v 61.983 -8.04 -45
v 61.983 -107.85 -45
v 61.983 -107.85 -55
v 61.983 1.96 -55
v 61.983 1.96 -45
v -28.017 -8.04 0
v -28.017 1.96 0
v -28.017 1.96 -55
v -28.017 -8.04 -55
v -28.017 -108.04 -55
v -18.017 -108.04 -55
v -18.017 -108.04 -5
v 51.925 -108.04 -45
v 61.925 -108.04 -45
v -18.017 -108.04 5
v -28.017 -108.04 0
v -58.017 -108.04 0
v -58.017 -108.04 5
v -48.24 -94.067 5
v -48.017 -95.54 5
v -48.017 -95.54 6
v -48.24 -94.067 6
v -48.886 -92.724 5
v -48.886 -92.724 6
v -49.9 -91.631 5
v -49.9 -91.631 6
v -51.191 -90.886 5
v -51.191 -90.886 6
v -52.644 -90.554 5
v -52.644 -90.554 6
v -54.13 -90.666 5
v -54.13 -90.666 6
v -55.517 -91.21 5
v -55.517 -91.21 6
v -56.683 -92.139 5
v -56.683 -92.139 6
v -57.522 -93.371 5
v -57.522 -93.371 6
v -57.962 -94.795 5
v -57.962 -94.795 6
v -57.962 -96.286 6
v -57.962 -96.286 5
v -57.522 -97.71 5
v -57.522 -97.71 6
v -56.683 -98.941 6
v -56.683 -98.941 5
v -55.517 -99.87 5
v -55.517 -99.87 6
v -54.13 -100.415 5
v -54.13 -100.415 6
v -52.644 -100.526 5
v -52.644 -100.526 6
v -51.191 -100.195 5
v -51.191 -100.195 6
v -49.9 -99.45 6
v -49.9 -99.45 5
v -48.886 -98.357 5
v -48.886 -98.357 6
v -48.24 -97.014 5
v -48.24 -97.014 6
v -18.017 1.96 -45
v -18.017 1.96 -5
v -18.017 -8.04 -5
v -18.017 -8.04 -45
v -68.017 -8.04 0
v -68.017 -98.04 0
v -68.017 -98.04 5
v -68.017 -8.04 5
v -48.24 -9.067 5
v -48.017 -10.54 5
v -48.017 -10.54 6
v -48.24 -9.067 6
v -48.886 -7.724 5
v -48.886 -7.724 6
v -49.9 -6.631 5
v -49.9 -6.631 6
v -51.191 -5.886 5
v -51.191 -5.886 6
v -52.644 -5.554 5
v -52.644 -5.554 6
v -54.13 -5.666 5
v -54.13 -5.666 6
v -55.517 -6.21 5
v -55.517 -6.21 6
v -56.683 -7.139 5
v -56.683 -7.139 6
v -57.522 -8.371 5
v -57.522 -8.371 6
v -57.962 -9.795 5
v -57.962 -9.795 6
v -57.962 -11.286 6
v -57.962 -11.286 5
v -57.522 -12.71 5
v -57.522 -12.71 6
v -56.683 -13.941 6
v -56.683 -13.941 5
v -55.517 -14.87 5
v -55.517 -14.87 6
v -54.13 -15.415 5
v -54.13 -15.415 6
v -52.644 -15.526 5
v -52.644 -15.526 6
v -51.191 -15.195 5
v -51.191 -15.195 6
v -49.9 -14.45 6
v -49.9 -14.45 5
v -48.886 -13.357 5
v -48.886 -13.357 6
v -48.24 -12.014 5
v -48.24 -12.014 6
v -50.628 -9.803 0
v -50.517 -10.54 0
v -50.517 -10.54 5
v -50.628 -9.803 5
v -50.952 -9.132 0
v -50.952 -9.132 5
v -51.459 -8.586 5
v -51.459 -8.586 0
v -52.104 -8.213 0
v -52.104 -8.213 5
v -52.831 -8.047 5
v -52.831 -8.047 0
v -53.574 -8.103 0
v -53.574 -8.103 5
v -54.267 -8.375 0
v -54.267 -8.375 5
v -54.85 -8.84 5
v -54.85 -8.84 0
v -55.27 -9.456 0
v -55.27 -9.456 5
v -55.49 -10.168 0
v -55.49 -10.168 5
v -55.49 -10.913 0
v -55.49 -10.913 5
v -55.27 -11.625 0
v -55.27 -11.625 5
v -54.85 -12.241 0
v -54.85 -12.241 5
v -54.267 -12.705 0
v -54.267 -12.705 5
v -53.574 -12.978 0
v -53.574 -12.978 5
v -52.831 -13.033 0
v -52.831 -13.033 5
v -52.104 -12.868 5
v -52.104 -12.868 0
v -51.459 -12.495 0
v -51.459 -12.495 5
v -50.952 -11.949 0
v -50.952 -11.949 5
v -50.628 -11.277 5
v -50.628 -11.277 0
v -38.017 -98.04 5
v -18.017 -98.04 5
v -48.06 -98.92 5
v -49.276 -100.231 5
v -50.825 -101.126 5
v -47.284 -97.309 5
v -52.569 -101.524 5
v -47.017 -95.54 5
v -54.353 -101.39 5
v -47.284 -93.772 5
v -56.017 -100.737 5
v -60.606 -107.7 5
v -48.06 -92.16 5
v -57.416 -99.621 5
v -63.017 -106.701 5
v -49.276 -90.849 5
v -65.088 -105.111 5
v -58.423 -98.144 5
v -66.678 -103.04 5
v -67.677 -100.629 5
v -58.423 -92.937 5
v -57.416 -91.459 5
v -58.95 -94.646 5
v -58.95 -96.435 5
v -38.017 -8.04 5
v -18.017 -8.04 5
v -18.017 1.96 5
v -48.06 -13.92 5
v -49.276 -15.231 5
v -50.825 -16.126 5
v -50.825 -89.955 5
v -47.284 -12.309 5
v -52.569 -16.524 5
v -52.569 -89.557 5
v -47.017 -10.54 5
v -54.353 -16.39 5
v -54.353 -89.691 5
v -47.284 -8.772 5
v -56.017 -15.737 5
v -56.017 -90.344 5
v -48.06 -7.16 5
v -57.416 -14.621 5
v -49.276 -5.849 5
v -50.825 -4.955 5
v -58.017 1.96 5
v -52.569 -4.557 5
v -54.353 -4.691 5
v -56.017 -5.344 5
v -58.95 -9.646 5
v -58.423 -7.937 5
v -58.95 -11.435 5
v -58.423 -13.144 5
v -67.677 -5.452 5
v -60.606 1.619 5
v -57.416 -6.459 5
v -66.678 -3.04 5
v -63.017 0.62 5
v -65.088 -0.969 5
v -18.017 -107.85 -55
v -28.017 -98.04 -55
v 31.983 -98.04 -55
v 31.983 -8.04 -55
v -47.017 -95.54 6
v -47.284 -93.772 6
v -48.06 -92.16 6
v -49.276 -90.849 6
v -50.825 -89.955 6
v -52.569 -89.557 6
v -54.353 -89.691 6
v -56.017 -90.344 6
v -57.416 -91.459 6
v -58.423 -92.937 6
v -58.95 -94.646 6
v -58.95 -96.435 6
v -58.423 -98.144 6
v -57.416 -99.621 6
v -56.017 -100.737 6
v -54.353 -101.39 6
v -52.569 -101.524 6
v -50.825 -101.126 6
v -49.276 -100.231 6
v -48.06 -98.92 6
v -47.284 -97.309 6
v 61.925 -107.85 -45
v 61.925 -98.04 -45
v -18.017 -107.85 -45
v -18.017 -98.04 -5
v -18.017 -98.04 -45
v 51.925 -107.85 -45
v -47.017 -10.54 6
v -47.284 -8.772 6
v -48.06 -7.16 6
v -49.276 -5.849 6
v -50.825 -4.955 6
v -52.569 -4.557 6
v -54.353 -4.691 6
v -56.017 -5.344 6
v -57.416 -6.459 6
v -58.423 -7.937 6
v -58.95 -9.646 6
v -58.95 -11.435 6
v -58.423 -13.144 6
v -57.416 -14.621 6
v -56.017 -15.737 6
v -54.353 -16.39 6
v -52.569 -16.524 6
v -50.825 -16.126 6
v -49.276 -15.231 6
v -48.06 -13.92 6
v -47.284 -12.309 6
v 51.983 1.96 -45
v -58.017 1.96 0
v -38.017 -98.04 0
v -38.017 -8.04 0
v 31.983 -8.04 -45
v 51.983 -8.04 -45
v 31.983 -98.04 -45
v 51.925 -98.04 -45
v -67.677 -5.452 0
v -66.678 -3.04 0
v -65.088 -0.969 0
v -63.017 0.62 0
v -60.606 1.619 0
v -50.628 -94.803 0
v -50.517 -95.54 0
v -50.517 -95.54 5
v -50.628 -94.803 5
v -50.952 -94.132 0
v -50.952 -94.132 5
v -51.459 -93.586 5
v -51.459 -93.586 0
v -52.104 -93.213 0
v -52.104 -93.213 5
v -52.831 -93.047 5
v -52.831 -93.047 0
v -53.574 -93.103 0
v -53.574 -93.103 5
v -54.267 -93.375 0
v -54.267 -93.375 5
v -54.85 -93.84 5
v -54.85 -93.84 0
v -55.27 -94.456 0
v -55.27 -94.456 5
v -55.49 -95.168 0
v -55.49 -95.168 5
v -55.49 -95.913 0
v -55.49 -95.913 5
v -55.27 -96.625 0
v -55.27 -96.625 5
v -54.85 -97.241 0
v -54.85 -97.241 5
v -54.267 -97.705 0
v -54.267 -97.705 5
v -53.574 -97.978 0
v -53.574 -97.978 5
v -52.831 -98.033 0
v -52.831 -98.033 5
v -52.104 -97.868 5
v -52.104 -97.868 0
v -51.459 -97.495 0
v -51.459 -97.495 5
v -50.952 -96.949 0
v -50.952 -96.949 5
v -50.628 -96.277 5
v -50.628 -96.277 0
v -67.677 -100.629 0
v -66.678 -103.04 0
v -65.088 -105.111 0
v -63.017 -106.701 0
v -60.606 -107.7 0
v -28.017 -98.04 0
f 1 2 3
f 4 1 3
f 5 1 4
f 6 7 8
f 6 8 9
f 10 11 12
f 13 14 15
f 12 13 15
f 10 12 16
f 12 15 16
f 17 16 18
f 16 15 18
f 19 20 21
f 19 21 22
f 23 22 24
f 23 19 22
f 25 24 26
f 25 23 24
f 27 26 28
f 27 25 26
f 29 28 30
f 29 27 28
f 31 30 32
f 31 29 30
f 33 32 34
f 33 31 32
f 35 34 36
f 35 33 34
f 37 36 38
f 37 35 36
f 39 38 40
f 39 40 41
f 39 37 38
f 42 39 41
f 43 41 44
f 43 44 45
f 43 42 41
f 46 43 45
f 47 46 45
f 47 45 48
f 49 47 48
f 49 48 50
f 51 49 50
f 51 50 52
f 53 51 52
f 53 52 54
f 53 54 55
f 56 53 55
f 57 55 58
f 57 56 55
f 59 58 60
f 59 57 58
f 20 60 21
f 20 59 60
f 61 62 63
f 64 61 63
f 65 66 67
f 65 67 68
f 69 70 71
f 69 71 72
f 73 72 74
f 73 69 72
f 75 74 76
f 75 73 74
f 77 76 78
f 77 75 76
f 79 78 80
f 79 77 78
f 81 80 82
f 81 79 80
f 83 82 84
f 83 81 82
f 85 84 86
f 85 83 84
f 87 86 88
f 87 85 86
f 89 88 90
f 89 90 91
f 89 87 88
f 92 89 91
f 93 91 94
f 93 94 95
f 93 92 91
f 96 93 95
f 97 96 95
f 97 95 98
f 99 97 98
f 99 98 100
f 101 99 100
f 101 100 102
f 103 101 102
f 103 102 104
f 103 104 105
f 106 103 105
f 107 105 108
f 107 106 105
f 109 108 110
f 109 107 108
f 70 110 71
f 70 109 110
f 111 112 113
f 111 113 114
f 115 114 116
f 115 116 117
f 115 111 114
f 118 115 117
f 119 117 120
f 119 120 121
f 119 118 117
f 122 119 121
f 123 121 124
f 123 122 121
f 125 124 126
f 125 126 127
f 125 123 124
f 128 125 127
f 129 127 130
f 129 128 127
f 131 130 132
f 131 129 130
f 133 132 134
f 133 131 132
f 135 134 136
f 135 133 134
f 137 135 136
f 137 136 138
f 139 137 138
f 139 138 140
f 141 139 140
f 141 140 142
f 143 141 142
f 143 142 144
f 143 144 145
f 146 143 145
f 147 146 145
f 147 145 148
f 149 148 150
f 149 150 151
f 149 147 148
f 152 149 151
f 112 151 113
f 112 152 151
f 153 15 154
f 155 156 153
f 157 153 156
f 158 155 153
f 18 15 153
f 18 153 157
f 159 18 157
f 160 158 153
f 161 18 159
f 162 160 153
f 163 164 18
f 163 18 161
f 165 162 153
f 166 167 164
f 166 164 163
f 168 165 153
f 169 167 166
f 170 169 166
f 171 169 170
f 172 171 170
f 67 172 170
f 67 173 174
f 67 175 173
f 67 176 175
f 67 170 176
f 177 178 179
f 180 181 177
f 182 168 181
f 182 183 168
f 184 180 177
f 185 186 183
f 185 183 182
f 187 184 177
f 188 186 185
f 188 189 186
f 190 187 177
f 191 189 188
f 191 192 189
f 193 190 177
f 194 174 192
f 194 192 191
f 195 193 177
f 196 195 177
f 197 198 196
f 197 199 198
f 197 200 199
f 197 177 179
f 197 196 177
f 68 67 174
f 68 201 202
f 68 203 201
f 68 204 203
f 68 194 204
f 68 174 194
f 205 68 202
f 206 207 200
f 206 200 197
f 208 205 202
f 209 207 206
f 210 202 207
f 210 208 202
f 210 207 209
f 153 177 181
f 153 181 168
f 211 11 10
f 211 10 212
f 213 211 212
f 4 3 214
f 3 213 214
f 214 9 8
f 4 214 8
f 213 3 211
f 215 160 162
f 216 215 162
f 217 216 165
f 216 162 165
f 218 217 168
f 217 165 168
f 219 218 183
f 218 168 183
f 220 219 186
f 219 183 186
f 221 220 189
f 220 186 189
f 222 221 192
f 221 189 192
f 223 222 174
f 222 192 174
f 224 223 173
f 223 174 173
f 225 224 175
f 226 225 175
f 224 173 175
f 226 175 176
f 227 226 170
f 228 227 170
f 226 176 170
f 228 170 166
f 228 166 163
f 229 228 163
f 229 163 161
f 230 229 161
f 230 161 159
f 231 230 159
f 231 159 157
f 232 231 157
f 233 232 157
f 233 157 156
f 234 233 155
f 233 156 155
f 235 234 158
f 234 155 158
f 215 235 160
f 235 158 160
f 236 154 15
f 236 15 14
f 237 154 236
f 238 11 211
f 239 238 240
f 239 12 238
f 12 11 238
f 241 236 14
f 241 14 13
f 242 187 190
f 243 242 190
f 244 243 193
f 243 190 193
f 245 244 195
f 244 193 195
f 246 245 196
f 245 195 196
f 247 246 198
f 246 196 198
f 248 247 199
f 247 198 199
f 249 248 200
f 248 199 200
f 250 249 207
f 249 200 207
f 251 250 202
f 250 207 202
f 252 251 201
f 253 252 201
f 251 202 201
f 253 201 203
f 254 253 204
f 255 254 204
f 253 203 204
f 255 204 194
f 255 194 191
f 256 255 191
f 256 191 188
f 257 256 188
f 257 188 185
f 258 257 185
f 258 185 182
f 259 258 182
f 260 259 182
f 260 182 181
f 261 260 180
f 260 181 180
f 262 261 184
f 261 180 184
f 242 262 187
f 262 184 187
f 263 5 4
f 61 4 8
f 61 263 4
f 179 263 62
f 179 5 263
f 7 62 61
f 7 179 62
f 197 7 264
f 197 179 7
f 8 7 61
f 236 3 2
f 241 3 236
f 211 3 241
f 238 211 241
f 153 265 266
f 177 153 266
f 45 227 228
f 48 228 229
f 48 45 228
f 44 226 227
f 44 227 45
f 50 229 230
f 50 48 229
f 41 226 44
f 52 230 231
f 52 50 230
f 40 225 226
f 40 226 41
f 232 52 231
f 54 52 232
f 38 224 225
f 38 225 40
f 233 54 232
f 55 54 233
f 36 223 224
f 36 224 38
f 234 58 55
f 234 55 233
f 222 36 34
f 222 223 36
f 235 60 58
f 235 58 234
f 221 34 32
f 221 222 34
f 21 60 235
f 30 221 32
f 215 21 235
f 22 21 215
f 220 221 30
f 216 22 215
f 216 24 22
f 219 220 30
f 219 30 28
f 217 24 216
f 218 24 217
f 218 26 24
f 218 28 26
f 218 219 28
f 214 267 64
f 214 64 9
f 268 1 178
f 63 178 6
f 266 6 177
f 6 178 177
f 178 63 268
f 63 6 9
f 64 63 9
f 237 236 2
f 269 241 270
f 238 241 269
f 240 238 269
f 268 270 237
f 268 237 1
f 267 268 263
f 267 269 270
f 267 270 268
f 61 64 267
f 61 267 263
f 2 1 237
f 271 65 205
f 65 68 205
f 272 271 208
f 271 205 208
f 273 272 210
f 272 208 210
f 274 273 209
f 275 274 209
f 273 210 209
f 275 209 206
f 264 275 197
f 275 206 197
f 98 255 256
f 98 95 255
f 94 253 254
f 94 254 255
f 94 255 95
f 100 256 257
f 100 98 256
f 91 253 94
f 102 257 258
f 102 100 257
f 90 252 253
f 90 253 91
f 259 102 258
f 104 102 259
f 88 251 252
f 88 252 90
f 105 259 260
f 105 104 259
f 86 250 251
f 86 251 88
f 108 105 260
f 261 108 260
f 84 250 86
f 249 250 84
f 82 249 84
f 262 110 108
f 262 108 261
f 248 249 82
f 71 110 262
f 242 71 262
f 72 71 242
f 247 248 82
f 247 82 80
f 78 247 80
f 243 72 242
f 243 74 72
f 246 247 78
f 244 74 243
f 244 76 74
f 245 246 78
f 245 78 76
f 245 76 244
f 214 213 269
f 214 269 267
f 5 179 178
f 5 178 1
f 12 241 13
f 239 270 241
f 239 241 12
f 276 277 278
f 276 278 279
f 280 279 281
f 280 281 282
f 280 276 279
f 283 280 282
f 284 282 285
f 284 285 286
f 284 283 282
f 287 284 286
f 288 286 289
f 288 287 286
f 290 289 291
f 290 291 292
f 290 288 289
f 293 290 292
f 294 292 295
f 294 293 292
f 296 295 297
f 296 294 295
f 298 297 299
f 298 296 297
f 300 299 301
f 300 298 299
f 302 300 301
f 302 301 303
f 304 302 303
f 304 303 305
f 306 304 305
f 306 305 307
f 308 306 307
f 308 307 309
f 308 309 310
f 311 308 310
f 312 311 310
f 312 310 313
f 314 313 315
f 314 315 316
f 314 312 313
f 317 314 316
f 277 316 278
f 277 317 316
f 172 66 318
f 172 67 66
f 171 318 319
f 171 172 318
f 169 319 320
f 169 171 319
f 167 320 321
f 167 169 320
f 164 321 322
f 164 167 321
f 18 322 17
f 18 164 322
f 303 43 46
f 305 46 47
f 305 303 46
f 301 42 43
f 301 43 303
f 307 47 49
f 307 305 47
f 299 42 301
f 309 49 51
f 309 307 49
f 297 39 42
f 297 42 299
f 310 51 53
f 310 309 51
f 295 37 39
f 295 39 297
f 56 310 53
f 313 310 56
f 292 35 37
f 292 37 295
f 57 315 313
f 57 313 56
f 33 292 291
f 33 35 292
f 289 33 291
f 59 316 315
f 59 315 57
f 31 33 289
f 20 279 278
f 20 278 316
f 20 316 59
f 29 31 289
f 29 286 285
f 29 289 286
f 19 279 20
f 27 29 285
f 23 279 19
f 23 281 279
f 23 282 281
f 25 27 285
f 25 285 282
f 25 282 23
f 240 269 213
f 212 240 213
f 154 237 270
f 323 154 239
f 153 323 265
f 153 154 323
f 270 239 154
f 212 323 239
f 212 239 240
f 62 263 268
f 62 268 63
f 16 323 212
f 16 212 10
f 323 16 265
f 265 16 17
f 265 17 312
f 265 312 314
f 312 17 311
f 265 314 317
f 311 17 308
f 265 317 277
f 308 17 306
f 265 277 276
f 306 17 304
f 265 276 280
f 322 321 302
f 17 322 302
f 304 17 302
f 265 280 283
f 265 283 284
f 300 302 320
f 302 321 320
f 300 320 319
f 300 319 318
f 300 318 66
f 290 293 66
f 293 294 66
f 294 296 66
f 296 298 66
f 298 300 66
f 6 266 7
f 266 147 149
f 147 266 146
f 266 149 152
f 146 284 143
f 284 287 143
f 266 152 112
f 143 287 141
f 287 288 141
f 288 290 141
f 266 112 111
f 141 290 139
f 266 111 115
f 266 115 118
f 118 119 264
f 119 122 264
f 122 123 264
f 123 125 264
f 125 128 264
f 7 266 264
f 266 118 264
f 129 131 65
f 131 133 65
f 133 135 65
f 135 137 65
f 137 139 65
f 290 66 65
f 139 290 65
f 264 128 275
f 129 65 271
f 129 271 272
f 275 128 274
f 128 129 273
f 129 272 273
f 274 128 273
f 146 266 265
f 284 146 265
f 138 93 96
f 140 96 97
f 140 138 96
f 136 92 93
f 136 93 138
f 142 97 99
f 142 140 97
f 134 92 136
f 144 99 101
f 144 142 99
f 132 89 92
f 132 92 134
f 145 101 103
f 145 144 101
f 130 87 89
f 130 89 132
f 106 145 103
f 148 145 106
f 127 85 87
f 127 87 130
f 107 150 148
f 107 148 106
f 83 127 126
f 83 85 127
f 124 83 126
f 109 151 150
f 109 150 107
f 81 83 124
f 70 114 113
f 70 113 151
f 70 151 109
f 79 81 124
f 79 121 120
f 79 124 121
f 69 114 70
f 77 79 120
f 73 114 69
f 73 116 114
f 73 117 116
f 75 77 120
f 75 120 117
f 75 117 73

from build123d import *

# Parameters (mm, degrees)
F0_W       = 30
F0_H       = 110
F0_R       = 2.5
F1_DEPTH   = 5
F2_R       = 10
F3_R       = 6
F3_R_2     = 5
F4_DEPTH   = 1
F5_W       = 10
F5_H       = 5
F6_DEPTH   = 20
F7_W       = 10
F7_H       = 10
F8_DEPTH   = 55
F9_W       = 109.809534
F9_H       = 10
F10_DEPTH  = 80
F10_FACE_W = 90
F10_FACE_H = 10
F11_DEPTH  = 50
F13_DEPTH  = 10
F15_DEPTH  = 10


with BuildPart() as f1:
    # F0 (on Top) → F1 (new body)
    with BuildSketch(Plane.XY):
        with Locations((-53.017432, -53.040362)):
            Rectangle(F0_W, F0_H)
        with Locations((-53.017432, -95.540362)):
            Circle(F0_R, mode=Mode.SUBTRACT)
        with Locations((-53.017432, -10.540362)):
            Circle(F0_R, mode=Mode.SUBTRACT)
    extrude(amount=F1_DEPTH)

    # F2
    f2_edges = [f1.edges().sort_by_distance(p)[0] for p in [
        (-68.017432, -108.040362, 2.5),
        (-68.017432, 1.959638, 2.5),
    ]]
    fillet(f2_edges, radius=F2_R)

    # F3 (on face) → F4 (join)
    with BuildSketch(Plane.XY.offset(5)):
        with Locations((-53.017432, -10.540362)):
            Circle(F3_R)
        with Locations((-53.017432, -10.540362)):
            Circle(F3_R_2, mode=Mode.SUBTRACT)
        with Locations((-53.017432, -95.540362)):
            Circle(F3_R)
        with Locations((-53.017432, -95.540362)):
            Circle(F3_R_2, mode=Mode.SUBTRACT)
    extrude(amount=F4_DEPTH)

    # F5 (on face) → F6 (join)
    with BuildSketch(Plane.YZ.offset(-38.017432)):
        with Locations((-103.040362, 2.5)):
            Rectangle(F5_W, F5_H)
        with Locations((-3.040362, 2.5)):
            Rectangle(F5_W, F5_H)
    extrude(amount=F6_DEPTH)

    # F7 (on face) → F8 (join)
    with BuildSketch(Plane(origin=(0, 0, 0), x_dir=(1, 0, 0), z_dir=(0, 0, -1))):
        with Locations((-23.017432, 3.040362)):
            Rectangle(F7_W, F7_H)
        with Locations((-23.017432, 103.040362)):
            Rectangle(F7_W, F7_H)
    extrude(amount=F8_DEPTH)

    # F9 (on face) → F10 (join)
    with BuildSketch(Plane.YZ.offset(-18.017432)):
        with Locations((-52.945129, -50)):
            Rectangle(F9_W, F9_H)
    extrude(amount=F10_DEPTH)

    # F10_face (on face) → F11 (cut)
    with BuildSketch(Plane(origin=(-18.017432, -53.040362, -50), x_dir=(0, 1, 0), z_dir=(-1, 0, 0))):
        Rectangle(F10_FACE_W, F10_FACE_H)
    extrude(amount=-F11_DEPTH, mode=Mode.SUBTRACT)

    # F12 (on face) → F13 (join)
    with BuildSketch(Plane(origin=(0, 1.959638, 0), x_dir=(-1, 0, 0), z_dir=(0, 1, 0))):
        Polygon((18.017432, -5), (18.017432, 5), (-61.982568, -45), (-51.982568, -45), align=None)
    extrude(amount=-F13_DEPTH)

    # F14 (on face) → F15 (join)
    with BuildSketch(Plane(origin=(0, -98.040362, 0), x_dir=(-1, 0, 0), z_dir=(0, 1, 0))):
        Polygon((18.017432, -5), (18.017432, 5), (-61.925042, -45), (-51.925042, -45), align=None)
    extrude(amount=-F15_DEPTH)


solid = f1.part
